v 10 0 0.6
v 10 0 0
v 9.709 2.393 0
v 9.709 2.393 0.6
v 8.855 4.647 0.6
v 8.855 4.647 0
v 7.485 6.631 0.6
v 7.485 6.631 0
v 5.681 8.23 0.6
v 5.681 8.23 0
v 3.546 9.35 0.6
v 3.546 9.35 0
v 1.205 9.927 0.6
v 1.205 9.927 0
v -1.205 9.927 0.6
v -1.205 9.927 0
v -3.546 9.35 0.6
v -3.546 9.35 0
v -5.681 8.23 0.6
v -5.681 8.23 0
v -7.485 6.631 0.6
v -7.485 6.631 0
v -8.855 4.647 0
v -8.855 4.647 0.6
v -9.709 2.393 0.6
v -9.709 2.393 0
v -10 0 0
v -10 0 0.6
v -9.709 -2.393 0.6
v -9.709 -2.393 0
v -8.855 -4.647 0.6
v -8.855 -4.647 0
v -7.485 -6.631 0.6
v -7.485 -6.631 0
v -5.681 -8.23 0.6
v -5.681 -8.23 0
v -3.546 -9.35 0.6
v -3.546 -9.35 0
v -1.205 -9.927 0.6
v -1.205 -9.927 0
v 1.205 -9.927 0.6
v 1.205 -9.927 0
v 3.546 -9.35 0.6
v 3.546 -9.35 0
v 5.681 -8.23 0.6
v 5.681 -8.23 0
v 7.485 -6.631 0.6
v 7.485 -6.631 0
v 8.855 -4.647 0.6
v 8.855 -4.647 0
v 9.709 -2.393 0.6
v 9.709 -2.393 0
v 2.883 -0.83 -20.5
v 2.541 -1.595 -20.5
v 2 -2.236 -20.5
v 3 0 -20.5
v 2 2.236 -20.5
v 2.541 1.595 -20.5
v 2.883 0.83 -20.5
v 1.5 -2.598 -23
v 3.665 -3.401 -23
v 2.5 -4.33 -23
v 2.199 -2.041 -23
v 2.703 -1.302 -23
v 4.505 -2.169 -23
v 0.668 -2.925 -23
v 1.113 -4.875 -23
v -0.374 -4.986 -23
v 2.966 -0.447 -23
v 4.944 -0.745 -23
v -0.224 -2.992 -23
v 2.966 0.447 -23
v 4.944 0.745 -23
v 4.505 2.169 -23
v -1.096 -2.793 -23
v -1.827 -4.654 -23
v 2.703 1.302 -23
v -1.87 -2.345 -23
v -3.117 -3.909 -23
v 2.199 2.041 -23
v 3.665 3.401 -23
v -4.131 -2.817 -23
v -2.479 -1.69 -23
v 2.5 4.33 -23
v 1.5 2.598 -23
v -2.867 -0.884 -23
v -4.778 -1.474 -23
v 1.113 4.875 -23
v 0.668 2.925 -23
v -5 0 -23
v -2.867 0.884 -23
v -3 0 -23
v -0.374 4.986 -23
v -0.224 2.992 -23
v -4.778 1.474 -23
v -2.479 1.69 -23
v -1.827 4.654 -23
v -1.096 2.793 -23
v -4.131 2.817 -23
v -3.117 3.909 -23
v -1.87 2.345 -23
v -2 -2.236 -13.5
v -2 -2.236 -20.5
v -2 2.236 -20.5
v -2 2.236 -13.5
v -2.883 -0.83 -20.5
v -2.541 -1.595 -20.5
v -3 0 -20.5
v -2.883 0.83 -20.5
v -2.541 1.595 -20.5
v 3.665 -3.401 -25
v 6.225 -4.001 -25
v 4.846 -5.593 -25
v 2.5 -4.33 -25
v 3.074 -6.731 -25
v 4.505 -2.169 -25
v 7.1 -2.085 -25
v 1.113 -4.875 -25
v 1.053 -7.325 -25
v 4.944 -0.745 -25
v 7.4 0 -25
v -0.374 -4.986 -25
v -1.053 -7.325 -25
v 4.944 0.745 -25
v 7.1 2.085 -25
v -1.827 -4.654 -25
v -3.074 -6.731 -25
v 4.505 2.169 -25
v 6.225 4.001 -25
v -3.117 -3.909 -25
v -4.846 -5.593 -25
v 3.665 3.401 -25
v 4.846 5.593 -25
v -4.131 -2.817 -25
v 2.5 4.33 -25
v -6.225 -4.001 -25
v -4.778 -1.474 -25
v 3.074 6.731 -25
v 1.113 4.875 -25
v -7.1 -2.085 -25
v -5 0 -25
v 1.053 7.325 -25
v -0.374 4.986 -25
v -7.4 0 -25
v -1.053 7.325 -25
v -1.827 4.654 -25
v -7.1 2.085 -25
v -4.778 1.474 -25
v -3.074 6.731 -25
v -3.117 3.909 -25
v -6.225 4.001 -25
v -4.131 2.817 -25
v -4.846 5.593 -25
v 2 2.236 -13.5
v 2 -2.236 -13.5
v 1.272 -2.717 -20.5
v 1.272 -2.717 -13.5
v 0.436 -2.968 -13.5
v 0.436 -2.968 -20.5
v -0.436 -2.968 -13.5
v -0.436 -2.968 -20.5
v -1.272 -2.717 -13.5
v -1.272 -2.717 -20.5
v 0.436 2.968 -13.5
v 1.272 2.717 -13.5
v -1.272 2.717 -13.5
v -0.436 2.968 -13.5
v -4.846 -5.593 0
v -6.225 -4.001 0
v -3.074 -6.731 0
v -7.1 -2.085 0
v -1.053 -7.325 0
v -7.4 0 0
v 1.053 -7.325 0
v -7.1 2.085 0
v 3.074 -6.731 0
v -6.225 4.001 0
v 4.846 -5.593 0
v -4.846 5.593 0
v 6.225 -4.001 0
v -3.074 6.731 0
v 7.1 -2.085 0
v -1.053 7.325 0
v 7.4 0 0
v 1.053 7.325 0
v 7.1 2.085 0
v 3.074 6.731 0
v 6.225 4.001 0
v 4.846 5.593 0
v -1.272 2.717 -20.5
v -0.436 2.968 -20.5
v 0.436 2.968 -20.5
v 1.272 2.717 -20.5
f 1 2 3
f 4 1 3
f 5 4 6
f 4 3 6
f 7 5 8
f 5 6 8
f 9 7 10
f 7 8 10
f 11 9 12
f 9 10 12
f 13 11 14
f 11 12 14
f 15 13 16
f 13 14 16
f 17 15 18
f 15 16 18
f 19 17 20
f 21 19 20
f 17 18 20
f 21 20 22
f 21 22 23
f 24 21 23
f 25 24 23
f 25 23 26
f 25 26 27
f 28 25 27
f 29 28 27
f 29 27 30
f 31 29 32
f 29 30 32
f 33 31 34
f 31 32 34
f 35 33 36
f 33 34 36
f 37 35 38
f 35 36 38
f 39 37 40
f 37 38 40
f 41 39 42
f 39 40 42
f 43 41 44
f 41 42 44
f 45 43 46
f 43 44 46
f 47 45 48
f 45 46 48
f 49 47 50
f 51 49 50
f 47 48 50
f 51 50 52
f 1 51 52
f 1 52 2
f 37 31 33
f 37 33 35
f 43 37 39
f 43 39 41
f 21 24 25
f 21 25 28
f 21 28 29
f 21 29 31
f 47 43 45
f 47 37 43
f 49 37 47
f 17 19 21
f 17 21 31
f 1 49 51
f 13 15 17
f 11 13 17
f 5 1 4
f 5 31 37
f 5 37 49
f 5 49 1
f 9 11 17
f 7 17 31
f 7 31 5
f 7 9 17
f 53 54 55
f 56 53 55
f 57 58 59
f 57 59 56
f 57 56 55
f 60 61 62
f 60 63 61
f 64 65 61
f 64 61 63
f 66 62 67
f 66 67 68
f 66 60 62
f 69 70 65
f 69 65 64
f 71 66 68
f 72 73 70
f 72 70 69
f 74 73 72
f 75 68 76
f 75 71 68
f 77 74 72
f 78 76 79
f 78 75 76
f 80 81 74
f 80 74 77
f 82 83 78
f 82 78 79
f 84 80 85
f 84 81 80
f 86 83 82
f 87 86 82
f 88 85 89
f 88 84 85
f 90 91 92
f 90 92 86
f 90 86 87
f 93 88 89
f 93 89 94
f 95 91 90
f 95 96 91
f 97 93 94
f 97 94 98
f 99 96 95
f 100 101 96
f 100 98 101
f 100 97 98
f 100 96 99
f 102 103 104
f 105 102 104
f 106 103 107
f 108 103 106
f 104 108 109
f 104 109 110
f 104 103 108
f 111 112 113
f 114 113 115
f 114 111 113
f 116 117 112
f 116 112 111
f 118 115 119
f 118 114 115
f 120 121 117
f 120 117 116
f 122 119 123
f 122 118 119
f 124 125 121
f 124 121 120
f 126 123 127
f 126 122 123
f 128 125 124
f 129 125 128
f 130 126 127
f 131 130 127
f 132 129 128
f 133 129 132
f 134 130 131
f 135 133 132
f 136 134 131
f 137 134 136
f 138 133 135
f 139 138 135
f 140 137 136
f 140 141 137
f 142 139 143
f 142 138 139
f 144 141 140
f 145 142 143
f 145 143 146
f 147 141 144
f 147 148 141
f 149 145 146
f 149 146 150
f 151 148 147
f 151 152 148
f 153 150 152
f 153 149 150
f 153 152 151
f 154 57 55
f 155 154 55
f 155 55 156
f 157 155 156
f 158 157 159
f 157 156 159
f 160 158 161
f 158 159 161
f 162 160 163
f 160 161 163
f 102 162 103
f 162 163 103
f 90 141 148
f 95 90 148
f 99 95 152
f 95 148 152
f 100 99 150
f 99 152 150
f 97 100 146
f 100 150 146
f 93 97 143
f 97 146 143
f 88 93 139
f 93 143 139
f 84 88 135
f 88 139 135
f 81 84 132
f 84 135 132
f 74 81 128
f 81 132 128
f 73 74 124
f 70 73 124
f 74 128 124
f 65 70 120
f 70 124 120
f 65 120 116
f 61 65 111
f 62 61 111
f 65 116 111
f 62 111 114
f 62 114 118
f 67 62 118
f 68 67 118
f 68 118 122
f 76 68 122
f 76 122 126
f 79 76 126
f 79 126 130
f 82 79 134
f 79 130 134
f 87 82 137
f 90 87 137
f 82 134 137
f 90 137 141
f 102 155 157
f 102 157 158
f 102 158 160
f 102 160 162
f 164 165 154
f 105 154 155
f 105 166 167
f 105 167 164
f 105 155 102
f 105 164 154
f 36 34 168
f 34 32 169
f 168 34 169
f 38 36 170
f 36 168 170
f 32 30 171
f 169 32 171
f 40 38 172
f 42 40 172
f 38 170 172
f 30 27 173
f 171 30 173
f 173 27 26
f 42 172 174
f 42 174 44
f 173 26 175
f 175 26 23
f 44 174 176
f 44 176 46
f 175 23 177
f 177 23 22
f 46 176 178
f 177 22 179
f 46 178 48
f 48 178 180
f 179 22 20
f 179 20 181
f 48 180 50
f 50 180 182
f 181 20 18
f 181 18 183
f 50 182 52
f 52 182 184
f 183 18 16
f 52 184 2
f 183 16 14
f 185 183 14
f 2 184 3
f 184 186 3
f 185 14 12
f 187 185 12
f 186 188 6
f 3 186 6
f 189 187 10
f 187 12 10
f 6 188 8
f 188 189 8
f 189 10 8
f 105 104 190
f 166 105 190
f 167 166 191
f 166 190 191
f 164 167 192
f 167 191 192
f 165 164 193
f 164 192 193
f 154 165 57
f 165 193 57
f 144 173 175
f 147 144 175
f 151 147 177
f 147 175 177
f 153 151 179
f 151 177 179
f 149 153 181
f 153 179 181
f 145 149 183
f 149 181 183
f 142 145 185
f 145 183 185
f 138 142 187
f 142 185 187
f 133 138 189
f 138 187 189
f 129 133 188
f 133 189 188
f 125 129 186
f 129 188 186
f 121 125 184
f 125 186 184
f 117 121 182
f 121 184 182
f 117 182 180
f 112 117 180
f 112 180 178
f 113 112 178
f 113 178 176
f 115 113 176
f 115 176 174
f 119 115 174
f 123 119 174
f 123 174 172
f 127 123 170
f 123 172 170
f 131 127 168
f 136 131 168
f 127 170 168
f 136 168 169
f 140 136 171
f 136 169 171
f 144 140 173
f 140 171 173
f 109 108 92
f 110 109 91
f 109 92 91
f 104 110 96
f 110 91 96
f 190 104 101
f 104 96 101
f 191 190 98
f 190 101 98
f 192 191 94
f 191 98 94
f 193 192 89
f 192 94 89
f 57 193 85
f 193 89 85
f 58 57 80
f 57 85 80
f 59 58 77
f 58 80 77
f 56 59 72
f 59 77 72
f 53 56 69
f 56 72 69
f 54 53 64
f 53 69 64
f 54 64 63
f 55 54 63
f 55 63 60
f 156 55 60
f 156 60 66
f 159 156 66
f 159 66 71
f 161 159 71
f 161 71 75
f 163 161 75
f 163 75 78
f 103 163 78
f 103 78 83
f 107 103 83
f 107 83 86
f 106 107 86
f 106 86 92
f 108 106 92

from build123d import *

# Parameters (mm, degrees)
SKETCH2_R           = 10
BOSS_EXTRUDE1_DEPTH = 0.6
SKETCH3_R           = 7.4
BOSS_EXTRUDE2_DEPTH = 25
SKETCH4_R           = 5
CUT_EXTRUDE1_DEPTH  = 2
SKETCH5_R           = 3
CUT_EXTRUDE2_DEPTH  = 2.5
CUT_EXTRUDE3_DEPTH  = 7


with BuildPart() as part:
    # Sketch2 → Boss-Extrude1 (new body)
    with BuildSketch(Plane.XY):
        Circle(SKETCH2_R)
    extrude(amount=BOSS_EXTRUDE1_DEPTH)

    # Sketch3 → Boss-Extrude2 (add)
    with BuildSketch(Plane(origin=(0, 0, 0), x_dir=(-1, 0, 0), z_dir=(0, 0, -1))):
        Circle(SKETCH3_R)
    extrude(amount=BOSS_EXTRUDE2_DEPTH)

    # Sketch4 → Cut-Extrude1 (cut)
    with BuildSketch(Plane(origin=(0, 0, -25), x_dir=(-1, 0, 0), z_dir=(0, 0, -1))):
        Circle(SKETCH4_R)
    extrude(amount=-CUT_EXTRUDE1_DEPTH, mode=Mode.SUBTRACT)

    # Sketch5 → Cut-Extrude2 (cut)
    with BuildSketch(Plane(origin=(0, 0, -23), x_dir=(-1, 0, 0), z_dir=(0, 0, -1))):
        Circle(SKETCH5_R)
    extrude(amount=-CUT_EXTRUDE2_DEPTH, mode=Mode.SUBTRACT)

    # Sketch6 → Cut-Extrude3 (cut)
    with BuildSketch(Plane(origin=(0, 0, -20.5), x_dir=(-1, 0, 0), z_dir=(0, 0, -1))):
        with BuildLine():
            Line((-2, 2.236067977), (-2, -2.236067977))
            ThreePointArc((-2, -2.236067977), (0, -3), (2, -2.236067977))
            Line((2, -2.236067977), (2, 2.236067977))
            ThreePointArc((2, 2.236067977), (0, 3), (-2, 2.236067977))
        make_face()
    extrude(amount=-CUT_EXTRUDE3_DEPTH, mode=Mode.SUBTRACT)


solid = part.part
